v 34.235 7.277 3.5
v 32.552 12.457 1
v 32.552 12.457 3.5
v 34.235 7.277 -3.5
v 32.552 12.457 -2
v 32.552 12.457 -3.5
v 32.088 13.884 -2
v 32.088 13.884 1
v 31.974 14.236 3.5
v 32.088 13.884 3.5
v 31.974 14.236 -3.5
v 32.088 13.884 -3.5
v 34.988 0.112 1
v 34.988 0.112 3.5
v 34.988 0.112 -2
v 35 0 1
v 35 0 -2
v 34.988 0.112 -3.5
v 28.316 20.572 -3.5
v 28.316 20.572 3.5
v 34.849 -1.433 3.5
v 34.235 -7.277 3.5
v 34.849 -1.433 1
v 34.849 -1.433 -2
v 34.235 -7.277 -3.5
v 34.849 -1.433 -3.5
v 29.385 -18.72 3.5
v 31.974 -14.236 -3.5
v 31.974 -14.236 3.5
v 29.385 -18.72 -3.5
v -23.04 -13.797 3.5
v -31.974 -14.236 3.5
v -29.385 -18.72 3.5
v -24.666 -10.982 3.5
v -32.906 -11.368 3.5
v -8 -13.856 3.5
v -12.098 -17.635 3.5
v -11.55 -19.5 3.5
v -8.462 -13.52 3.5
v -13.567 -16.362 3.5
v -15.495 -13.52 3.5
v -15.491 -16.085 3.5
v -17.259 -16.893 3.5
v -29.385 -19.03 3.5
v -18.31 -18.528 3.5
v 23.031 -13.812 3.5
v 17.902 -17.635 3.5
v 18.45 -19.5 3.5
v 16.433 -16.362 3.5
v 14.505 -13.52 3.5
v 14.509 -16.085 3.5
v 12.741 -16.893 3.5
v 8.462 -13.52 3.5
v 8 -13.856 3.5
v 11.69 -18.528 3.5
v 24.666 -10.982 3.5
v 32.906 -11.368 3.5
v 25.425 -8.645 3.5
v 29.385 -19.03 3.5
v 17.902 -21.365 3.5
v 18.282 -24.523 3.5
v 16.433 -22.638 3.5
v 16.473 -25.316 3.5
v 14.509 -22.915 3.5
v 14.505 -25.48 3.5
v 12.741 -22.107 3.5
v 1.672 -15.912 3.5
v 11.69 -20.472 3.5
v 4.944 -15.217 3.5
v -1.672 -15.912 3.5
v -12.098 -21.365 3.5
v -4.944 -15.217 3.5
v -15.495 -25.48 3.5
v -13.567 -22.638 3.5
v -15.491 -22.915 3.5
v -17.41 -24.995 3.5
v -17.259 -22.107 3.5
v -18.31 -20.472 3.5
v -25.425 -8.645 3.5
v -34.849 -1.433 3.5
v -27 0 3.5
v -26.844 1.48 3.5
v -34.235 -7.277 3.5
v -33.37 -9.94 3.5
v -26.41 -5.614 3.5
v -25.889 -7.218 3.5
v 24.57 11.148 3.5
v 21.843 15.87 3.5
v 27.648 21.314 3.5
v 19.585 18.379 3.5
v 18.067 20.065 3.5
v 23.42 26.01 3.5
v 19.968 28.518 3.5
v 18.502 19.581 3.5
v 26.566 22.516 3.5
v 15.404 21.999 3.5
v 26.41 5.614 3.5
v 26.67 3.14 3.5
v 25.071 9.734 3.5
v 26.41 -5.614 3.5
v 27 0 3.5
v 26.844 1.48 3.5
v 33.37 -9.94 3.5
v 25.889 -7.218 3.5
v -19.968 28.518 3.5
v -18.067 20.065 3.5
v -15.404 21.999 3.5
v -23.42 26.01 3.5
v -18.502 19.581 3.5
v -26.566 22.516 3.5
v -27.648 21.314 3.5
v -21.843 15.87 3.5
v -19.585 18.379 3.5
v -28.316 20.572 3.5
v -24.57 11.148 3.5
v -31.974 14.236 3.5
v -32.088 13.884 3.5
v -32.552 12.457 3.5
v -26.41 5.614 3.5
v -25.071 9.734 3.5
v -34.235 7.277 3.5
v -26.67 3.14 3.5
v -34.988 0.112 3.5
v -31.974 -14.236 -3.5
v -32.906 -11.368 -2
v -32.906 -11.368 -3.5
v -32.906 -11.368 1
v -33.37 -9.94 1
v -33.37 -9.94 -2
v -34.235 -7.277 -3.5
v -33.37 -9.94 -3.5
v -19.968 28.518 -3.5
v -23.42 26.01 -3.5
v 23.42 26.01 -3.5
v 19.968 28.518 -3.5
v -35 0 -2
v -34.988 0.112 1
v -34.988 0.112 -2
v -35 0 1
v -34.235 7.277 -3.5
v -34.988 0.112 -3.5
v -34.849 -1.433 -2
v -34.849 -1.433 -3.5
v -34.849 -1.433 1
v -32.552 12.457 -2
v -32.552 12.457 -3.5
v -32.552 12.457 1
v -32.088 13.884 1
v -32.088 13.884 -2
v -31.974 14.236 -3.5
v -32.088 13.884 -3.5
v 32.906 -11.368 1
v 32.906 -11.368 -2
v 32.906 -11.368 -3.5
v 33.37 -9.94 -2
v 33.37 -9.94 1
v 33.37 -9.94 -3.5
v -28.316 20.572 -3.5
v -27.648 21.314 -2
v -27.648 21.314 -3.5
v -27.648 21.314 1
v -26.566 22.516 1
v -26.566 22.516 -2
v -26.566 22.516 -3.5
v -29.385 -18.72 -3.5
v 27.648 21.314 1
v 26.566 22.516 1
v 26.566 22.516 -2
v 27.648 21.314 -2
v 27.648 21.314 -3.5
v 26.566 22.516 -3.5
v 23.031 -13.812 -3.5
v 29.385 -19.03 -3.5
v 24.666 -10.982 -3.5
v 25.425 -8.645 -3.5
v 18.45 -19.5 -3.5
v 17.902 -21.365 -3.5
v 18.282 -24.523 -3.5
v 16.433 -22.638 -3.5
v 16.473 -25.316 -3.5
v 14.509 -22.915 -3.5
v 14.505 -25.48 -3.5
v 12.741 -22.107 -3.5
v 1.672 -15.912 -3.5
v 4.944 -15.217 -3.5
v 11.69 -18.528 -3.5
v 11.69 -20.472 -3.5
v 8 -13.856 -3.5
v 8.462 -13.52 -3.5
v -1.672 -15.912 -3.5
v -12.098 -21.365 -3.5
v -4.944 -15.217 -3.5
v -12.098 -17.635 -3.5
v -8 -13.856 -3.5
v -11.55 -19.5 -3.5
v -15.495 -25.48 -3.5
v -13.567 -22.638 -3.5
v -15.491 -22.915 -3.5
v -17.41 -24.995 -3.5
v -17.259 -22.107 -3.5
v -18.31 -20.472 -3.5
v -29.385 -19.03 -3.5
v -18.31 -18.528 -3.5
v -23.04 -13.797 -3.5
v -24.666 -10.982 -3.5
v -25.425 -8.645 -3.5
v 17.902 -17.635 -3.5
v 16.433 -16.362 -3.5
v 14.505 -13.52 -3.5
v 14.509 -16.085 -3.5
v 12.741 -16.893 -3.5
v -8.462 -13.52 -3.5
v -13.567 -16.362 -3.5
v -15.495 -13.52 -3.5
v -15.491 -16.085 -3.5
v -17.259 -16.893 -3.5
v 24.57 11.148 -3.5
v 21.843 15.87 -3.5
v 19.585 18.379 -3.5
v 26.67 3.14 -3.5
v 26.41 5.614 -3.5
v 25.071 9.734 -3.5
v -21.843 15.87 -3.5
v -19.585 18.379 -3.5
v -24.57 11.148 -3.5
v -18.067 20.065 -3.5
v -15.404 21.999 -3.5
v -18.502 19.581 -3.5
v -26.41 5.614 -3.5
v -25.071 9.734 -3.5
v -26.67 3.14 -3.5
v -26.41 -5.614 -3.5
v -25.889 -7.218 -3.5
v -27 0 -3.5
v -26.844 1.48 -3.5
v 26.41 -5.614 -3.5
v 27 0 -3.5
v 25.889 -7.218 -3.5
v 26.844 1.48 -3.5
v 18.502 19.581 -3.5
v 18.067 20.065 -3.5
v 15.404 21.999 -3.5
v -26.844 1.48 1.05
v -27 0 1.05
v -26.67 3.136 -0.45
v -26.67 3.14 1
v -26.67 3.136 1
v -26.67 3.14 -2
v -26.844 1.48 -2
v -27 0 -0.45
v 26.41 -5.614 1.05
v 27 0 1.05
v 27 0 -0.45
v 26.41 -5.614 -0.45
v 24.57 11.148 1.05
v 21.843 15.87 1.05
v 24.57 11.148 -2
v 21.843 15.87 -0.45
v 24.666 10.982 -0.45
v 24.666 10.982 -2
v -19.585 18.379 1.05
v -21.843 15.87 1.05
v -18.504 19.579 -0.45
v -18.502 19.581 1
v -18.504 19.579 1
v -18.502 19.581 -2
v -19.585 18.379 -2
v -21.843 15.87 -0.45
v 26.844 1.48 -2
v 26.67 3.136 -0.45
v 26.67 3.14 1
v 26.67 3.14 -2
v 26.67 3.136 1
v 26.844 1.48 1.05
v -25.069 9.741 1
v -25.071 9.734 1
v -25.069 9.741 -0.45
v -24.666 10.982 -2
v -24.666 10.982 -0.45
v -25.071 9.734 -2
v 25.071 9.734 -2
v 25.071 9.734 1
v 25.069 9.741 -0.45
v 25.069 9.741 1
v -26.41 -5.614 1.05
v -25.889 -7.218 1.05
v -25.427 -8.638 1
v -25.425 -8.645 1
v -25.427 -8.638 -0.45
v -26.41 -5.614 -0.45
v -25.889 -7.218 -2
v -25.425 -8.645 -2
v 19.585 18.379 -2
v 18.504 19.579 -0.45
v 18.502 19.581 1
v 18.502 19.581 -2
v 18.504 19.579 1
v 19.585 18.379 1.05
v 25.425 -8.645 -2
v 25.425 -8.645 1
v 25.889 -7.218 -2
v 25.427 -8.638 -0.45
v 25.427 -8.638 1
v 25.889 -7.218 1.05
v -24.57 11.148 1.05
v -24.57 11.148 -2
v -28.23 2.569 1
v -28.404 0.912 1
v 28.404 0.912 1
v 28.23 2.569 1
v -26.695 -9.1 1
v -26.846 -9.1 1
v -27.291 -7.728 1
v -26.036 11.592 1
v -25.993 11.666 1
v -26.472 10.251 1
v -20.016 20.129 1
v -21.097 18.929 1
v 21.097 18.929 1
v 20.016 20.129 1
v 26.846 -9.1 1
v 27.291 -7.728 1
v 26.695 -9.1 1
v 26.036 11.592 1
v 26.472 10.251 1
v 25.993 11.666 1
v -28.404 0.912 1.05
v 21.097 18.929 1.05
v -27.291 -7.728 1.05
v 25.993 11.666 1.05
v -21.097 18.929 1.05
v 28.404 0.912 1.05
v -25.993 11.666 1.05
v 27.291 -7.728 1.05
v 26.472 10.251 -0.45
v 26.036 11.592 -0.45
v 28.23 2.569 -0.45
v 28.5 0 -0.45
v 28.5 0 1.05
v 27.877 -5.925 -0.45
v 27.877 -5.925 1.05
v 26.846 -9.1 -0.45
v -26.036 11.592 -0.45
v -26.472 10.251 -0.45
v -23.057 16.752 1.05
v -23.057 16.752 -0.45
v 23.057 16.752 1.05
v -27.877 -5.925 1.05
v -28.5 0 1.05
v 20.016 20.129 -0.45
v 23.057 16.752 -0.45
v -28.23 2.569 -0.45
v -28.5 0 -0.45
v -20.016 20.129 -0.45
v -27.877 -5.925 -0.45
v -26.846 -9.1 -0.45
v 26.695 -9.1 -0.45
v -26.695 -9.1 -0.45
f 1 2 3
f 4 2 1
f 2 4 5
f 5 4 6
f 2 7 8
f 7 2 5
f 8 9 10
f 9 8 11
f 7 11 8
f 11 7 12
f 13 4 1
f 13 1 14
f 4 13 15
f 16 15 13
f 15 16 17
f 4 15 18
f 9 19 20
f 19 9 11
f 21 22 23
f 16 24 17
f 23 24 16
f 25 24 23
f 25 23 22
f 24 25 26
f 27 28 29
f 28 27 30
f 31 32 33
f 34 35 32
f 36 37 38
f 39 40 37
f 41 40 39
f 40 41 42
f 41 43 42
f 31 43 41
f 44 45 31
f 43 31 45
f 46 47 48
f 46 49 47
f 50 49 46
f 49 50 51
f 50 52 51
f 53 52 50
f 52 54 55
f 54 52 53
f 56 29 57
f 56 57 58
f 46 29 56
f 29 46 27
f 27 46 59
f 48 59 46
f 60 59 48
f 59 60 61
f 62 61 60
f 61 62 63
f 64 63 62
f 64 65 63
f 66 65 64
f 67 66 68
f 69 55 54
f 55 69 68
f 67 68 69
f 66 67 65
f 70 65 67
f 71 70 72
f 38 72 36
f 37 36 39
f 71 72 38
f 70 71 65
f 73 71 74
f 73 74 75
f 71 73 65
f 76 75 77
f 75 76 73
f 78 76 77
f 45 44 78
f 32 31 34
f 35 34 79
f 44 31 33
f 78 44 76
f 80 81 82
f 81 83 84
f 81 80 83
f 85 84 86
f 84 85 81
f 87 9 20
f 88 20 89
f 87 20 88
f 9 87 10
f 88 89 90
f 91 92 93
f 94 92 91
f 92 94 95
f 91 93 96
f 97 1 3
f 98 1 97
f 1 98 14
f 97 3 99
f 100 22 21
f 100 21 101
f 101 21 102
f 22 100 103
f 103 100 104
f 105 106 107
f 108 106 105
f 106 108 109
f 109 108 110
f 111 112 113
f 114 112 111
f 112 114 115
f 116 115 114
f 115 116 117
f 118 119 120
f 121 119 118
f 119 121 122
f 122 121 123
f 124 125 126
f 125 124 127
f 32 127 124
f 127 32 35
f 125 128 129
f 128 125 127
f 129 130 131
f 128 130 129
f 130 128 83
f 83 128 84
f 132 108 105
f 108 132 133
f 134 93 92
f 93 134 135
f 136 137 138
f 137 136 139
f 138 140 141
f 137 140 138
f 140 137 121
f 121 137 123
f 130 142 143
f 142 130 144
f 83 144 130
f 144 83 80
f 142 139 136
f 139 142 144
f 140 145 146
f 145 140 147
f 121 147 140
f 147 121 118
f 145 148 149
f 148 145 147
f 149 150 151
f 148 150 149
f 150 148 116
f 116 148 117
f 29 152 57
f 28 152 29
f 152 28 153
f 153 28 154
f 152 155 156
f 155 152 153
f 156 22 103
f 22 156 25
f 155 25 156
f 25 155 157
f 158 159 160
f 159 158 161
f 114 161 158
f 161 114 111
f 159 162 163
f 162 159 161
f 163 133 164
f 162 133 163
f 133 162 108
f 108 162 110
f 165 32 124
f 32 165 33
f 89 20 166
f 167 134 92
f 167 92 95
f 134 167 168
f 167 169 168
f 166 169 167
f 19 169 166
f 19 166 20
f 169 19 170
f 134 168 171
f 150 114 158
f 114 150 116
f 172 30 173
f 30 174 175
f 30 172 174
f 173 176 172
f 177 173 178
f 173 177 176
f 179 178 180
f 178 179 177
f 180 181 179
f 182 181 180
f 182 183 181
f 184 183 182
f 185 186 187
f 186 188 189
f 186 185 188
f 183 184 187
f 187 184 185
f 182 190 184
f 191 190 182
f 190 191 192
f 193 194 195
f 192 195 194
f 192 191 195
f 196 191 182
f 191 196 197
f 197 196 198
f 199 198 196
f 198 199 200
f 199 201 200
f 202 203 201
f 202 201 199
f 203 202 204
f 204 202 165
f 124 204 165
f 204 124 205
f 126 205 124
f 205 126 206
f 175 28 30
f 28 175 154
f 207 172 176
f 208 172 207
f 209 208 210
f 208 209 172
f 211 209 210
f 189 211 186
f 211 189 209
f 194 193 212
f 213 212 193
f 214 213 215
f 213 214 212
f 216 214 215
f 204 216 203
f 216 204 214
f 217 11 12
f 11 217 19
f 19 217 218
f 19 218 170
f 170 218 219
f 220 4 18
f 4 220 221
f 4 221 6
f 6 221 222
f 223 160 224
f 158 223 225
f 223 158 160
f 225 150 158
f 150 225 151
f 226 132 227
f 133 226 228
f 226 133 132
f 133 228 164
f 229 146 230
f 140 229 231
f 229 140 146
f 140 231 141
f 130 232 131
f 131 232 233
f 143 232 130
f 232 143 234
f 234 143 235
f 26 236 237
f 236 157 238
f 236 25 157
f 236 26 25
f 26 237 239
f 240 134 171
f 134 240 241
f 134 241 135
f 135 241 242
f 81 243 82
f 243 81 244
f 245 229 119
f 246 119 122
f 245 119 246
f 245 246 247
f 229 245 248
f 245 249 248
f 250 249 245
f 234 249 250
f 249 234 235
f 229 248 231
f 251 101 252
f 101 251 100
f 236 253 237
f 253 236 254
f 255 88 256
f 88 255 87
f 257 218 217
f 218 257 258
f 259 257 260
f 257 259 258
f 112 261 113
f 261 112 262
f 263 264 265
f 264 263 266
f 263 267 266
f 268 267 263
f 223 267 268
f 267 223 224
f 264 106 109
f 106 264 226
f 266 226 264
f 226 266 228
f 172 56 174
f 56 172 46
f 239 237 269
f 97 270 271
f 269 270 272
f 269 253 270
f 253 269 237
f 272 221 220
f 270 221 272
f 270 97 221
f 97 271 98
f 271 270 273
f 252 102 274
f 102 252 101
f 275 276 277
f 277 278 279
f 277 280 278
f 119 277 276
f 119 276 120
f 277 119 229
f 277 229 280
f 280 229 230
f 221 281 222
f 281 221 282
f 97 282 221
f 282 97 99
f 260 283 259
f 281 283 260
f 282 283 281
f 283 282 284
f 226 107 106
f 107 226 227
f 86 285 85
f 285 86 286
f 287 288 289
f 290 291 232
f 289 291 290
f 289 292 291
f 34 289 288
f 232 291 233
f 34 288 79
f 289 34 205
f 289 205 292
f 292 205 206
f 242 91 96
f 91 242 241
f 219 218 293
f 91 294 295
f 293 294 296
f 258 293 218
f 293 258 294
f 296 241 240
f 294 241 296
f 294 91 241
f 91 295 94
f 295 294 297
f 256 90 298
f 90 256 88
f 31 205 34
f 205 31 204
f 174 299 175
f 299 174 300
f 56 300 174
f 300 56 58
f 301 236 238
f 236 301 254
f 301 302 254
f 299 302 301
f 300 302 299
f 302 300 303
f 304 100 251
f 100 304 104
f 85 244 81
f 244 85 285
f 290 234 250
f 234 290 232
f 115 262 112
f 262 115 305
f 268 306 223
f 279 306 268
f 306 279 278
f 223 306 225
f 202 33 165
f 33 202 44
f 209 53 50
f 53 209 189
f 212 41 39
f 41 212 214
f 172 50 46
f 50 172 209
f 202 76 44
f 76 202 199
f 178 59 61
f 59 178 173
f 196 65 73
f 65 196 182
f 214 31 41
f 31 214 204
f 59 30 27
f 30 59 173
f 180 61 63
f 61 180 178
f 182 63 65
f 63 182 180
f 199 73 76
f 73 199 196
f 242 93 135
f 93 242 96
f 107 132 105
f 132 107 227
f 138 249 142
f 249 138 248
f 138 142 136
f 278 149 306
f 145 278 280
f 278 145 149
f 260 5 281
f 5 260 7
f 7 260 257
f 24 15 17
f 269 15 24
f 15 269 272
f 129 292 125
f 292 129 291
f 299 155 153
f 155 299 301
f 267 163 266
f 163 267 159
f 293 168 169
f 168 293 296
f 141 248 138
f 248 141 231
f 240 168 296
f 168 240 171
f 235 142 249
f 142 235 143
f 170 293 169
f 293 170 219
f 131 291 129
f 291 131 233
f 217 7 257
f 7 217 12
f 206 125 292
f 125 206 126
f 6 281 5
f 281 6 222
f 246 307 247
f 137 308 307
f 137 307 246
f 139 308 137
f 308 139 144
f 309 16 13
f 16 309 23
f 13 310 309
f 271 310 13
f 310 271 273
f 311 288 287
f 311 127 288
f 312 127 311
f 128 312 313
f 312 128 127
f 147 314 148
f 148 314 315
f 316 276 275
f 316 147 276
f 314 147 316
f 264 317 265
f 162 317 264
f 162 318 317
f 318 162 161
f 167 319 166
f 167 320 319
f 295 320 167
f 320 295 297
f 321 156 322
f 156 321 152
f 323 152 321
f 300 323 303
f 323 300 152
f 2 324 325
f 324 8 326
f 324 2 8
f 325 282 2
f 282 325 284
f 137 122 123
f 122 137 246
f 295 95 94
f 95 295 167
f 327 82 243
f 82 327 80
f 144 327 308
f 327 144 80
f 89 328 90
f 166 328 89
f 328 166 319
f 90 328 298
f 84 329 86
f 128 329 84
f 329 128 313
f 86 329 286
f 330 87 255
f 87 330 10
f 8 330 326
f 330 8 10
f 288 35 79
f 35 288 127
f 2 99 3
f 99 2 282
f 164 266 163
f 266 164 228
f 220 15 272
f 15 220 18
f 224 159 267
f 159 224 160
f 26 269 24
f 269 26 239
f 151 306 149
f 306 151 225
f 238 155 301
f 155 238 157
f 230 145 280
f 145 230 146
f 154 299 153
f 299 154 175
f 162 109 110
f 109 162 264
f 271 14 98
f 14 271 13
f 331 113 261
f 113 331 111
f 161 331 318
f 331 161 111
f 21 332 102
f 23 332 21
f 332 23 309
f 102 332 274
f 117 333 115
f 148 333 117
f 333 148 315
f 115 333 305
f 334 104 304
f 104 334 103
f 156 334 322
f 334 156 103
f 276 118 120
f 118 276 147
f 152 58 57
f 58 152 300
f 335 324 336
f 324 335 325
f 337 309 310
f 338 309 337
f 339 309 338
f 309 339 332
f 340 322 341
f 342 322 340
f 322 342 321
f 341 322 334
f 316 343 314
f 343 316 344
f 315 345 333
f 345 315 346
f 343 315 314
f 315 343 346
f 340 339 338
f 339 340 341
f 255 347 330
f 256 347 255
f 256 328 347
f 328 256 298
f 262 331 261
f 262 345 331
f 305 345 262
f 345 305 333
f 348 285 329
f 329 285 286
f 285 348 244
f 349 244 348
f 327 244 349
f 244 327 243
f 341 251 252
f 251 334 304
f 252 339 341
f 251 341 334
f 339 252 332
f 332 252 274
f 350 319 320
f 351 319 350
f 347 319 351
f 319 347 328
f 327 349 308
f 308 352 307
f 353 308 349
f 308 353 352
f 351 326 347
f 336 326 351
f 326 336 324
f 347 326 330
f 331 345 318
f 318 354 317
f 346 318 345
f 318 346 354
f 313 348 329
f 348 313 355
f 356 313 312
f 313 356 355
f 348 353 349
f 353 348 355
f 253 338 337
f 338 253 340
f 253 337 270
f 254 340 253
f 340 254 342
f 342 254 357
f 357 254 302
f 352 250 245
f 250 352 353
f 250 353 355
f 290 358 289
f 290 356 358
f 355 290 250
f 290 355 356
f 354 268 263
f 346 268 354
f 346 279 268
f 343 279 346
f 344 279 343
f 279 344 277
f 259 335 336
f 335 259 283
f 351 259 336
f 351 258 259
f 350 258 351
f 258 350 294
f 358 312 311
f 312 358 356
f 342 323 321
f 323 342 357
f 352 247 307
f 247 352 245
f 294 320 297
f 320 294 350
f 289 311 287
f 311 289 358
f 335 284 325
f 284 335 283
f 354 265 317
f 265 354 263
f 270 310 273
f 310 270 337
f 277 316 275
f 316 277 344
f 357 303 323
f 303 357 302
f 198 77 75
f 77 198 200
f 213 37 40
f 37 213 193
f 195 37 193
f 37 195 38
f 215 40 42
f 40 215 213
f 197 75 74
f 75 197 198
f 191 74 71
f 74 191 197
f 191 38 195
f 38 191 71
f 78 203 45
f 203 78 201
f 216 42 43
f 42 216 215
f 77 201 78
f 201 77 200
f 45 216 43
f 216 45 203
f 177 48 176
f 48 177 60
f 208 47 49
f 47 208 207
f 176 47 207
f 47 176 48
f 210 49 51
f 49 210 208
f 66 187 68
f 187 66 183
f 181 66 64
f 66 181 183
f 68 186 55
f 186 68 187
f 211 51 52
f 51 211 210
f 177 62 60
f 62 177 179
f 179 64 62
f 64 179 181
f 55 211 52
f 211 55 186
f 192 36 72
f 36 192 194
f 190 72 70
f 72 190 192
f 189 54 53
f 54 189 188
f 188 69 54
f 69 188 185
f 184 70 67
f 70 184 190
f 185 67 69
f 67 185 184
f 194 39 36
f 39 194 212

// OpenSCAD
use <MCAD/triangles.scad>

//$fa=0.01;
//$fs=0.5;

pinHole=-19.5;

ringw=7;
angle=70;
dia=35;

module nt55() {
	cylinder(r=10,h=145,center=true);
}

module se2a() {
	cylinder(r=11,h=162,center=true);
}

module ring() {
	difference() {
		union() {
			difference() {
				cylinder(r=dia,h=ringw,center=true);
				cylinder(r=(dia-(dia/4.375)),h=ringw+2,center=true);
				translate([0,-29,0]) {
					cube([(dia*2.05714285714286),(dia*0.57142857142857),ringw+2],center=true);
				}
			}
			hull() {
				translate([-(dia*0.42857142857143),pinHole,0])
				cylinder(r=6,h=ringw,center=true);
				translate([(dia*0.42857142857143),pinHole,0])
				cylinder(r=6,h=ringw,center=true);
	
				translate([0,-(dia*0.47228571428571),0]) {
					cube([(dia*1.67914285714286),(dia/7),ringw],center=true);
				}
			}	
		}
	}
}

module innerNotches() {
	translate([0,0,(ringw/2)-3.2])
	intersection() {
		difference() {
			cylinder(r=(dia*0.81428571428571),h=(dia*0.04285714285714),center=true);
			
			cylinder(r=(dia*0.75714285714286),h=(dia*0.07142857142857),center=true);
		
			translate([0,-(dia*0.54571428571429),0]) {
				cube([(dia*1.67142857142857),(dia*0.57142857142857),ringw],center=true);
			}
		}
		
		translate([0,(dia*0.19228571428571),0]) {
			rotate([0,0,20])
			cube([(dia*2.14285714285714),(dia*0.32828571428571),(dia*0.04285714285714)],center=true);
			rotate([0,0,-20])
			cube([(dia*2.14285714285714),(dia*0.32828571428571),(dia*0.04285714285714)],center=true);
		}
	}
}

module notchset() {
		union() {
			translate([0,(dia*0.14285714285714),-1])
				cube([75,1.5,3],center=true);
			translate([0,-5,-1])
				cube([75,1.5,3],center=true);
			
			translate([0,0,-ringw])
			union() {
				translate([0,5,0])
				cube([75,1.5,3],center=true);
				translate([0,-5,0])
				cube([75,1.5,3],center=true);
			}
		}
}

module notches() {		
	translate([0,0,ringw/2]) {
		translate([-2,6,0])
		rotate([0,0,20])
		notchset(); 
	
		translate([2,6,0])
		rotate([0,0,-20])
		notchset();
	}
}

module topNotch() {
	union() {
		translate([0,40,-((ringw/2)+ringw/4)])
		rotate([0,0,-90])
			a_triangle(angle/2,40,ringw*1.5);
		
		translate([0,40,((ringw/2)+ringw/4)])
		rotate([0,180,-270])
			a_triangle(angle/2,40,ringw*1.5);		
		
		translate([0,31,0])
			cube([1,10,ringw],center=true);
	}
}

module shockMountEnd() {
	difference() {
		ring();
		topNotch();
		notches();
		color("red")
			innerNotches();
		translate([-15,pinHole,0])
		cylinder(r=3.45,h=ringw*1.5,center=true);
		translate([15,pinHole,0])
		cylinder(r=3.45,h=ringw*1.5,center=true);
		cylinder(r=16,h=ringw*1.5,center=true);
	}
}


//translate([0,0,-5])
//cube(11);

//translate([0,0,0])
//nt55();

shockMountEnd();
